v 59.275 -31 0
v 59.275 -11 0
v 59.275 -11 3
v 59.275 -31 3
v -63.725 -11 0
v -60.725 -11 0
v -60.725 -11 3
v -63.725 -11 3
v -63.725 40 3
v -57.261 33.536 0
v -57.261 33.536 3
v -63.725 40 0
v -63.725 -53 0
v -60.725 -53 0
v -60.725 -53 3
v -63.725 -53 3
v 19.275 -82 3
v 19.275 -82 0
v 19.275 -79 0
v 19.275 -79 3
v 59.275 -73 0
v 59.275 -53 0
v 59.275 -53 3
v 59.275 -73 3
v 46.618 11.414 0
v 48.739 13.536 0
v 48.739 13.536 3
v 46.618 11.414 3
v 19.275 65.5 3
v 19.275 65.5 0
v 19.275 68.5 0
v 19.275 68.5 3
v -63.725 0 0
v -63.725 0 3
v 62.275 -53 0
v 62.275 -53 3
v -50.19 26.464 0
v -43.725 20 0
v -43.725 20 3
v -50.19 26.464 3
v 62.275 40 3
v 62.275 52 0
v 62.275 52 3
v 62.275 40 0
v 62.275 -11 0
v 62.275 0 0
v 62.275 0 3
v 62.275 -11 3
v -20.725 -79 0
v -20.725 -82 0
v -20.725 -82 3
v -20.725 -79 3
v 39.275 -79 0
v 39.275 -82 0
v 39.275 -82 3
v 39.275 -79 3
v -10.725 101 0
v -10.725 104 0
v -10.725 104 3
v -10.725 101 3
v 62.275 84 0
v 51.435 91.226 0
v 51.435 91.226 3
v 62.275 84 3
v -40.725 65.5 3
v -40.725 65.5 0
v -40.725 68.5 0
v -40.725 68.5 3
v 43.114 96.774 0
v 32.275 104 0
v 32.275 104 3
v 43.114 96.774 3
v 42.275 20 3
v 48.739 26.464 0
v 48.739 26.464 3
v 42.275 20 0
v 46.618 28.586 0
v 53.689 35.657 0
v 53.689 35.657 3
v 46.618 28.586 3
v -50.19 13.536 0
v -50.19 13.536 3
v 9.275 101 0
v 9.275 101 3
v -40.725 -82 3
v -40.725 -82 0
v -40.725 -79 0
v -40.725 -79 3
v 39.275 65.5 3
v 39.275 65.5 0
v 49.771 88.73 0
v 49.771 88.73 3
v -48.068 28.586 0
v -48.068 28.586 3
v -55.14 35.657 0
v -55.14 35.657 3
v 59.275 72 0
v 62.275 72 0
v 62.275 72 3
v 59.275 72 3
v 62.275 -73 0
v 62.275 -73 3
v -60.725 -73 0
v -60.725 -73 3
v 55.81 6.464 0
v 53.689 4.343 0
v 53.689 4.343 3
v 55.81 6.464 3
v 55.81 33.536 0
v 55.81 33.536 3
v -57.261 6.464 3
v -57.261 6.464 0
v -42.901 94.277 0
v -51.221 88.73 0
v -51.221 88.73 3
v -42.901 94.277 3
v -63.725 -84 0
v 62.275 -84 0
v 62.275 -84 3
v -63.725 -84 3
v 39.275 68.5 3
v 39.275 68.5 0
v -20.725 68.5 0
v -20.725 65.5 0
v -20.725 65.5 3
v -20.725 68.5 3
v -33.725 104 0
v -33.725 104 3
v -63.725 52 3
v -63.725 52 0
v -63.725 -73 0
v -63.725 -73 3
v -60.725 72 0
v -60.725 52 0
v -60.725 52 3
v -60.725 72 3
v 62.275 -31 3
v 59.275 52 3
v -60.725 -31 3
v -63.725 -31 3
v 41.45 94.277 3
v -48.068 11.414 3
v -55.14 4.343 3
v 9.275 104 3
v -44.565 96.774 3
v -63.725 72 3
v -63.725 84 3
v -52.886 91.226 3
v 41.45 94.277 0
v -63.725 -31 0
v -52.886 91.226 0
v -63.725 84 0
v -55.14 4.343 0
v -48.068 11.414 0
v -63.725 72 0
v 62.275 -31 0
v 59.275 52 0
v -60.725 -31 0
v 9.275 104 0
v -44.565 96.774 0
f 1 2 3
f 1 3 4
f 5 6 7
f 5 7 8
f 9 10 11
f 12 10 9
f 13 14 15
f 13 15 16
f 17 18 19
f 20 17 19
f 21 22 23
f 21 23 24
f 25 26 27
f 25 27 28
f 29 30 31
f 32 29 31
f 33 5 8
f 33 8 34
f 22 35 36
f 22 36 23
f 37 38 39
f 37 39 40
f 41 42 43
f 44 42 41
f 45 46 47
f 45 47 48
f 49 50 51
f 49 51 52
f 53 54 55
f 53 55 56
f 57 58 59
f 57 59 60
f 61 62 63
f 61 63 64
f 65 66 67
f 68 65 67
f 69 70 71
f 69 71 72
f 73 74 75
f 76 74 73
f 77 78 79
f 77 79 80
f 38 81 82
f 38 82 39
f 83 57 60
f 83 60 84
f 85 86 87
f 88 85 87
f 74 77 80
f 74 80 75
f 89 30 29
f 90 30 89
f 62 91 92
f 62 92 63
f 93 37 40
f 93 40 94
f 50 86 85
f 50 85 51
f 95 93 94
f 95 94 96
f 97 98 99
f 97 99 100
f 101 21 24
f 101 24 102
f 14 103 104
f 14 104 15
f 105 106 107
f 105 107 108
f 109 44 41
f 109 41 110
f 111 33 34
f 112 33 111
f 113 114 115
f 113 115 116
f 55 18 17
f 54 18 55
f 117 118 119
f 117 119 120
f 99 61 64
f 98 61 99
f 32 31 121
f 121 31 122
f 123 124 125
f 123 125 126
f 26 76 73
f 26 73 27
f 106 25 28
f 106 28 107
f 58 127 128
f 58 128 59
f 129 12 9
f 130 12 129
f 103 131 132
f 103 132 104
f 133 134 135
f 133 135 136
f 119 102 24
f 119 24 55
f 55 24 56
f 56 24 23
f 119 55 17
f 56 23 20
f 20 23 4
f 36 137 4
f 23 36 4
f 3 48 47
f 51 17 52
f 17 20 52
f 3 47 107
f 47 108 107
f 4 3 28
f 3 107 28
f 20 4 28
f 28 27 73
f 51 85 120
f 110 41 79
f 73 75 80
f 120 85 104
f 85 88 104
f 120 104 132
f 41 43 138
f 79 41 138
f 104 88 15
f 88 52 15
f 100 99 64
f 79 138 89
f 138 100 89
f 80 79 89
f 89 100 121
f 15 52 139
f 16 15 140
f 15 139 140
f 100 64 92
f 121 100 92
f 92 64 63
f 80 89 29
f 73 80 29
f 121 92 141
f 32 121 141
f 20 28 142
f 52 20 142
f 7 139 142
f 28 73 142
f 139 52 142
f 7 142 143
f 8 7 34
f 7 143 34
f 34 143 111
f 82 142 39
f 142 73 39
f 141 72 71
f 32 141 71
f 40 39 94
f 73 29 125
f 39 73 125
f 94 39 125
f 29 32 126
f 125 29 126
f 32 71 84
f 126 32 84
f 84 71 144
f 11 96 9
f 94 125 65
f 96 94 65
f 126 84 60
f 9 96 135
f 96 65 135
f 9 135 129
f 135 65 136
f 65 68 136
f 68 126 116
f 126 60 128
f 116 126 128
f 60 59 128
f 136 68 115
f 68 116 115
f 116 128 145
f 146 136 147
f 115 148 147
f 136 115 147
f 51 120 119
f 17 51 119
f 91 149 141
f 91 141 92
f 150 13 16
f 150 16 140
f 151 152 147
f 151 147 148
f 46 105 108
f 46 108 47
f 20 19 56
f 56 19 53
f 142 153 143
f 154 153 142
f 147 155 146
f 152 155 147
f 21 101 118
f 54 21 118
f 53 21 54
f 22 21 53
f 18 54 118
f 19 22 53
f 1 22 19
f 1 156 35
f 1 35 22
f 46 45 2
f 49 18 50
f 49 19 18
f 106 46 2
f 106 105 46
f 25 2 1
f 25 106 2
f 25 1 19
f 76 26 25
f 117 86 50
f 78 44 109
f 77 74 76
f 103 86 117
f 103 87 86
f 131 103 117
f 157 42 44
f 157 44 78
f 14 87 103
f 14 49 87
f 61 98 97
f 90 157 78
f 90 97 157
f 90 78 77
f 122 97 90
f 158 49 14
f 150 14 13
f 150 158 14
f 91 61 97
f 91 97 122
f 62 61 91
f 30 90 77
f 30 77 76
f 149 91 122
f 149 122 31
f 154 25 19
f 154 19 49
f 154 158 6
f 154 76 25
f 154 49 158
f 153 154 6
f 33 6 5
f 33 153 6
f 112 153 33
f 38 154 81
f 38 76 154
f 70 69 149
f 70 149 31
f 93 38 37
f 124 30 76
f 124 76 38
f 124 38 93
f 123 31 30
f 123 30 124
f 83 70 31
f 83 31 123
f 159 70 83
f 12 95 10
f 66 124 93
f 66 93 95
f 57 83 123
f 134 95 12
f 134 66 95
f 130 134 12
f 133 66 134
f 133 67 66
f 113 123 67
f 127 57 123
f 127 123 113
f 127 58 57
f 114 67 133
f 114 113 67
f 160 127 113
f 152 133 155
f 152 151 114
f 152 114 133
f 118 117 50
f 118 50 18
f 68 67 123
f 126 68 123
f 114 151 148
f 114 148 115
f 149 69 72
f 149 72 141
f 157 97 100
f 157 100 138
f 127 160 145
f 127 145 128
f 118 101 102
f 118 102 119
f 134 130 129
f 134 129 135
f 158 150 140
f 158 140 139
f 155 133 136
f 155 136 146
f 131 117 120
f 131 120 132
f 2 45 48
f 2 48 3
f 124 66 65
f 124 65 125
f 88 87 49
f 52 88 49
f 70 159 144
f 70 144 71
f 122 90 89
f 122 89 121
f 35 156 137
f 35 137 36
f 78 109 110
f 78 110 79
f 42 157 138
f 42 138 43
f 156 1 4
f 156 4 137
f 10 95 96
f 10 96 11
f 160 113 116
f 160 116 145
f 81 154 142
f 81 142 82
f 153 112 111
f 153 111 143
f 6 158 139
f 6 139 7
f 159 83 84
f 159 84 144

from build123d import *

# Parameters (mm, degrees)
SKETCH1_W           = 20
SKETCH1_H           = 3
BOSS_EXTRUDE1_DEPTH = 3


with BuildPart() as part:
    # Sketch1 → Boss-Extrude1 (new body)
    with BuildSketch(Plane.XY):
        Polygon((62.274694919, 0), (62.274694919, -11), (59.274694919, -11), (59.274694919, -31), (62.274694919, -31), (62.274694919, -53), (59.274694919, -53), (59.274694919, -73), (62.274694919, -73), (62.274694919, -84), (-63.725305081, -84), (-63.725305081, -73), (-60.725305081, -73), (-60.725305081, -53), (-63.725305081, -53), (-63.725305081, -31), (-60.725305081, -31), (-60.725305081, -11), (-63.725305081, -11), (-63.725305081, 0), (-57.260838987, 6.464466094), (-55.139518643, 4.343145751), (-48.068450831, 11.414213562), (-50.189771175, 13.535533906), (-43.725305081, 20), (-50.189771175, 26.464466094), (-48.068450831, 28.585786438), (-55.139518643, 35.656854249), (-57.260838987, 33.535533906), (-63.725305081, 40), (-63.725305081, 52), (-60.725305081, 52), (-60.725305081, 72), (-63.725305081, 72), (-63.725305081, 84), (-52.885556553, 91.226499019), (-51.221455964, 88.730348136), (-42.90095302, 94.277350098), (-44.565053609, 96.773500981), (-33.725305081, 104), (-10.725305081, 104), (-10.725305081, 101), (9.274694919, 101), (9.274694919, 104), (32.274694919, 104), (43.114443447, 96.773500981), (41.450342859, 94.277350098), (49.770845802, 88.730348136), (51.434946391, 91.226499019), (62.274694919, 84), (62.274694919, 72), (59.274694919, 72), (59.274694919, 52), (62.274694919, 52), (62.274694919, 40), (55.810228825, 33.535533906), (53.688908482, 35.656854249), (46.61784067, 28.585786438), (48.739161013, 26.464466094), (42.274694919, 20), (48.739161013, 13.535533906), (46.61784067, 11.414213562), (53.688908482, 4.343145751), (55.810228825, 6.464466094), align=None)
        with Locations((29.274694919, -80.5)):
            Rectangle(SKETCH1_W, SKETCH1_H, mode=Mode.SUBTRACT)
        with Locations((-30.725305081, -80.5)):
            Rectangle(SKETCH1_W, SKETCH1_H, mode=Mode.SUBTRACT)
        with Locations((29.274694919, 67)):
            Rectangle(SKETCH1_W, SKETCH1_H, mode=Mode.SUBTRACT)
        with Locations((-30.725305081, 67)):
            Rectangle(SKETCH1_W, SKETCH1_H, mode=Mode.SUBTRACT)
    extrude(amount=BOSS_EXTRUDE1_DEPTH)


solid = part.part
